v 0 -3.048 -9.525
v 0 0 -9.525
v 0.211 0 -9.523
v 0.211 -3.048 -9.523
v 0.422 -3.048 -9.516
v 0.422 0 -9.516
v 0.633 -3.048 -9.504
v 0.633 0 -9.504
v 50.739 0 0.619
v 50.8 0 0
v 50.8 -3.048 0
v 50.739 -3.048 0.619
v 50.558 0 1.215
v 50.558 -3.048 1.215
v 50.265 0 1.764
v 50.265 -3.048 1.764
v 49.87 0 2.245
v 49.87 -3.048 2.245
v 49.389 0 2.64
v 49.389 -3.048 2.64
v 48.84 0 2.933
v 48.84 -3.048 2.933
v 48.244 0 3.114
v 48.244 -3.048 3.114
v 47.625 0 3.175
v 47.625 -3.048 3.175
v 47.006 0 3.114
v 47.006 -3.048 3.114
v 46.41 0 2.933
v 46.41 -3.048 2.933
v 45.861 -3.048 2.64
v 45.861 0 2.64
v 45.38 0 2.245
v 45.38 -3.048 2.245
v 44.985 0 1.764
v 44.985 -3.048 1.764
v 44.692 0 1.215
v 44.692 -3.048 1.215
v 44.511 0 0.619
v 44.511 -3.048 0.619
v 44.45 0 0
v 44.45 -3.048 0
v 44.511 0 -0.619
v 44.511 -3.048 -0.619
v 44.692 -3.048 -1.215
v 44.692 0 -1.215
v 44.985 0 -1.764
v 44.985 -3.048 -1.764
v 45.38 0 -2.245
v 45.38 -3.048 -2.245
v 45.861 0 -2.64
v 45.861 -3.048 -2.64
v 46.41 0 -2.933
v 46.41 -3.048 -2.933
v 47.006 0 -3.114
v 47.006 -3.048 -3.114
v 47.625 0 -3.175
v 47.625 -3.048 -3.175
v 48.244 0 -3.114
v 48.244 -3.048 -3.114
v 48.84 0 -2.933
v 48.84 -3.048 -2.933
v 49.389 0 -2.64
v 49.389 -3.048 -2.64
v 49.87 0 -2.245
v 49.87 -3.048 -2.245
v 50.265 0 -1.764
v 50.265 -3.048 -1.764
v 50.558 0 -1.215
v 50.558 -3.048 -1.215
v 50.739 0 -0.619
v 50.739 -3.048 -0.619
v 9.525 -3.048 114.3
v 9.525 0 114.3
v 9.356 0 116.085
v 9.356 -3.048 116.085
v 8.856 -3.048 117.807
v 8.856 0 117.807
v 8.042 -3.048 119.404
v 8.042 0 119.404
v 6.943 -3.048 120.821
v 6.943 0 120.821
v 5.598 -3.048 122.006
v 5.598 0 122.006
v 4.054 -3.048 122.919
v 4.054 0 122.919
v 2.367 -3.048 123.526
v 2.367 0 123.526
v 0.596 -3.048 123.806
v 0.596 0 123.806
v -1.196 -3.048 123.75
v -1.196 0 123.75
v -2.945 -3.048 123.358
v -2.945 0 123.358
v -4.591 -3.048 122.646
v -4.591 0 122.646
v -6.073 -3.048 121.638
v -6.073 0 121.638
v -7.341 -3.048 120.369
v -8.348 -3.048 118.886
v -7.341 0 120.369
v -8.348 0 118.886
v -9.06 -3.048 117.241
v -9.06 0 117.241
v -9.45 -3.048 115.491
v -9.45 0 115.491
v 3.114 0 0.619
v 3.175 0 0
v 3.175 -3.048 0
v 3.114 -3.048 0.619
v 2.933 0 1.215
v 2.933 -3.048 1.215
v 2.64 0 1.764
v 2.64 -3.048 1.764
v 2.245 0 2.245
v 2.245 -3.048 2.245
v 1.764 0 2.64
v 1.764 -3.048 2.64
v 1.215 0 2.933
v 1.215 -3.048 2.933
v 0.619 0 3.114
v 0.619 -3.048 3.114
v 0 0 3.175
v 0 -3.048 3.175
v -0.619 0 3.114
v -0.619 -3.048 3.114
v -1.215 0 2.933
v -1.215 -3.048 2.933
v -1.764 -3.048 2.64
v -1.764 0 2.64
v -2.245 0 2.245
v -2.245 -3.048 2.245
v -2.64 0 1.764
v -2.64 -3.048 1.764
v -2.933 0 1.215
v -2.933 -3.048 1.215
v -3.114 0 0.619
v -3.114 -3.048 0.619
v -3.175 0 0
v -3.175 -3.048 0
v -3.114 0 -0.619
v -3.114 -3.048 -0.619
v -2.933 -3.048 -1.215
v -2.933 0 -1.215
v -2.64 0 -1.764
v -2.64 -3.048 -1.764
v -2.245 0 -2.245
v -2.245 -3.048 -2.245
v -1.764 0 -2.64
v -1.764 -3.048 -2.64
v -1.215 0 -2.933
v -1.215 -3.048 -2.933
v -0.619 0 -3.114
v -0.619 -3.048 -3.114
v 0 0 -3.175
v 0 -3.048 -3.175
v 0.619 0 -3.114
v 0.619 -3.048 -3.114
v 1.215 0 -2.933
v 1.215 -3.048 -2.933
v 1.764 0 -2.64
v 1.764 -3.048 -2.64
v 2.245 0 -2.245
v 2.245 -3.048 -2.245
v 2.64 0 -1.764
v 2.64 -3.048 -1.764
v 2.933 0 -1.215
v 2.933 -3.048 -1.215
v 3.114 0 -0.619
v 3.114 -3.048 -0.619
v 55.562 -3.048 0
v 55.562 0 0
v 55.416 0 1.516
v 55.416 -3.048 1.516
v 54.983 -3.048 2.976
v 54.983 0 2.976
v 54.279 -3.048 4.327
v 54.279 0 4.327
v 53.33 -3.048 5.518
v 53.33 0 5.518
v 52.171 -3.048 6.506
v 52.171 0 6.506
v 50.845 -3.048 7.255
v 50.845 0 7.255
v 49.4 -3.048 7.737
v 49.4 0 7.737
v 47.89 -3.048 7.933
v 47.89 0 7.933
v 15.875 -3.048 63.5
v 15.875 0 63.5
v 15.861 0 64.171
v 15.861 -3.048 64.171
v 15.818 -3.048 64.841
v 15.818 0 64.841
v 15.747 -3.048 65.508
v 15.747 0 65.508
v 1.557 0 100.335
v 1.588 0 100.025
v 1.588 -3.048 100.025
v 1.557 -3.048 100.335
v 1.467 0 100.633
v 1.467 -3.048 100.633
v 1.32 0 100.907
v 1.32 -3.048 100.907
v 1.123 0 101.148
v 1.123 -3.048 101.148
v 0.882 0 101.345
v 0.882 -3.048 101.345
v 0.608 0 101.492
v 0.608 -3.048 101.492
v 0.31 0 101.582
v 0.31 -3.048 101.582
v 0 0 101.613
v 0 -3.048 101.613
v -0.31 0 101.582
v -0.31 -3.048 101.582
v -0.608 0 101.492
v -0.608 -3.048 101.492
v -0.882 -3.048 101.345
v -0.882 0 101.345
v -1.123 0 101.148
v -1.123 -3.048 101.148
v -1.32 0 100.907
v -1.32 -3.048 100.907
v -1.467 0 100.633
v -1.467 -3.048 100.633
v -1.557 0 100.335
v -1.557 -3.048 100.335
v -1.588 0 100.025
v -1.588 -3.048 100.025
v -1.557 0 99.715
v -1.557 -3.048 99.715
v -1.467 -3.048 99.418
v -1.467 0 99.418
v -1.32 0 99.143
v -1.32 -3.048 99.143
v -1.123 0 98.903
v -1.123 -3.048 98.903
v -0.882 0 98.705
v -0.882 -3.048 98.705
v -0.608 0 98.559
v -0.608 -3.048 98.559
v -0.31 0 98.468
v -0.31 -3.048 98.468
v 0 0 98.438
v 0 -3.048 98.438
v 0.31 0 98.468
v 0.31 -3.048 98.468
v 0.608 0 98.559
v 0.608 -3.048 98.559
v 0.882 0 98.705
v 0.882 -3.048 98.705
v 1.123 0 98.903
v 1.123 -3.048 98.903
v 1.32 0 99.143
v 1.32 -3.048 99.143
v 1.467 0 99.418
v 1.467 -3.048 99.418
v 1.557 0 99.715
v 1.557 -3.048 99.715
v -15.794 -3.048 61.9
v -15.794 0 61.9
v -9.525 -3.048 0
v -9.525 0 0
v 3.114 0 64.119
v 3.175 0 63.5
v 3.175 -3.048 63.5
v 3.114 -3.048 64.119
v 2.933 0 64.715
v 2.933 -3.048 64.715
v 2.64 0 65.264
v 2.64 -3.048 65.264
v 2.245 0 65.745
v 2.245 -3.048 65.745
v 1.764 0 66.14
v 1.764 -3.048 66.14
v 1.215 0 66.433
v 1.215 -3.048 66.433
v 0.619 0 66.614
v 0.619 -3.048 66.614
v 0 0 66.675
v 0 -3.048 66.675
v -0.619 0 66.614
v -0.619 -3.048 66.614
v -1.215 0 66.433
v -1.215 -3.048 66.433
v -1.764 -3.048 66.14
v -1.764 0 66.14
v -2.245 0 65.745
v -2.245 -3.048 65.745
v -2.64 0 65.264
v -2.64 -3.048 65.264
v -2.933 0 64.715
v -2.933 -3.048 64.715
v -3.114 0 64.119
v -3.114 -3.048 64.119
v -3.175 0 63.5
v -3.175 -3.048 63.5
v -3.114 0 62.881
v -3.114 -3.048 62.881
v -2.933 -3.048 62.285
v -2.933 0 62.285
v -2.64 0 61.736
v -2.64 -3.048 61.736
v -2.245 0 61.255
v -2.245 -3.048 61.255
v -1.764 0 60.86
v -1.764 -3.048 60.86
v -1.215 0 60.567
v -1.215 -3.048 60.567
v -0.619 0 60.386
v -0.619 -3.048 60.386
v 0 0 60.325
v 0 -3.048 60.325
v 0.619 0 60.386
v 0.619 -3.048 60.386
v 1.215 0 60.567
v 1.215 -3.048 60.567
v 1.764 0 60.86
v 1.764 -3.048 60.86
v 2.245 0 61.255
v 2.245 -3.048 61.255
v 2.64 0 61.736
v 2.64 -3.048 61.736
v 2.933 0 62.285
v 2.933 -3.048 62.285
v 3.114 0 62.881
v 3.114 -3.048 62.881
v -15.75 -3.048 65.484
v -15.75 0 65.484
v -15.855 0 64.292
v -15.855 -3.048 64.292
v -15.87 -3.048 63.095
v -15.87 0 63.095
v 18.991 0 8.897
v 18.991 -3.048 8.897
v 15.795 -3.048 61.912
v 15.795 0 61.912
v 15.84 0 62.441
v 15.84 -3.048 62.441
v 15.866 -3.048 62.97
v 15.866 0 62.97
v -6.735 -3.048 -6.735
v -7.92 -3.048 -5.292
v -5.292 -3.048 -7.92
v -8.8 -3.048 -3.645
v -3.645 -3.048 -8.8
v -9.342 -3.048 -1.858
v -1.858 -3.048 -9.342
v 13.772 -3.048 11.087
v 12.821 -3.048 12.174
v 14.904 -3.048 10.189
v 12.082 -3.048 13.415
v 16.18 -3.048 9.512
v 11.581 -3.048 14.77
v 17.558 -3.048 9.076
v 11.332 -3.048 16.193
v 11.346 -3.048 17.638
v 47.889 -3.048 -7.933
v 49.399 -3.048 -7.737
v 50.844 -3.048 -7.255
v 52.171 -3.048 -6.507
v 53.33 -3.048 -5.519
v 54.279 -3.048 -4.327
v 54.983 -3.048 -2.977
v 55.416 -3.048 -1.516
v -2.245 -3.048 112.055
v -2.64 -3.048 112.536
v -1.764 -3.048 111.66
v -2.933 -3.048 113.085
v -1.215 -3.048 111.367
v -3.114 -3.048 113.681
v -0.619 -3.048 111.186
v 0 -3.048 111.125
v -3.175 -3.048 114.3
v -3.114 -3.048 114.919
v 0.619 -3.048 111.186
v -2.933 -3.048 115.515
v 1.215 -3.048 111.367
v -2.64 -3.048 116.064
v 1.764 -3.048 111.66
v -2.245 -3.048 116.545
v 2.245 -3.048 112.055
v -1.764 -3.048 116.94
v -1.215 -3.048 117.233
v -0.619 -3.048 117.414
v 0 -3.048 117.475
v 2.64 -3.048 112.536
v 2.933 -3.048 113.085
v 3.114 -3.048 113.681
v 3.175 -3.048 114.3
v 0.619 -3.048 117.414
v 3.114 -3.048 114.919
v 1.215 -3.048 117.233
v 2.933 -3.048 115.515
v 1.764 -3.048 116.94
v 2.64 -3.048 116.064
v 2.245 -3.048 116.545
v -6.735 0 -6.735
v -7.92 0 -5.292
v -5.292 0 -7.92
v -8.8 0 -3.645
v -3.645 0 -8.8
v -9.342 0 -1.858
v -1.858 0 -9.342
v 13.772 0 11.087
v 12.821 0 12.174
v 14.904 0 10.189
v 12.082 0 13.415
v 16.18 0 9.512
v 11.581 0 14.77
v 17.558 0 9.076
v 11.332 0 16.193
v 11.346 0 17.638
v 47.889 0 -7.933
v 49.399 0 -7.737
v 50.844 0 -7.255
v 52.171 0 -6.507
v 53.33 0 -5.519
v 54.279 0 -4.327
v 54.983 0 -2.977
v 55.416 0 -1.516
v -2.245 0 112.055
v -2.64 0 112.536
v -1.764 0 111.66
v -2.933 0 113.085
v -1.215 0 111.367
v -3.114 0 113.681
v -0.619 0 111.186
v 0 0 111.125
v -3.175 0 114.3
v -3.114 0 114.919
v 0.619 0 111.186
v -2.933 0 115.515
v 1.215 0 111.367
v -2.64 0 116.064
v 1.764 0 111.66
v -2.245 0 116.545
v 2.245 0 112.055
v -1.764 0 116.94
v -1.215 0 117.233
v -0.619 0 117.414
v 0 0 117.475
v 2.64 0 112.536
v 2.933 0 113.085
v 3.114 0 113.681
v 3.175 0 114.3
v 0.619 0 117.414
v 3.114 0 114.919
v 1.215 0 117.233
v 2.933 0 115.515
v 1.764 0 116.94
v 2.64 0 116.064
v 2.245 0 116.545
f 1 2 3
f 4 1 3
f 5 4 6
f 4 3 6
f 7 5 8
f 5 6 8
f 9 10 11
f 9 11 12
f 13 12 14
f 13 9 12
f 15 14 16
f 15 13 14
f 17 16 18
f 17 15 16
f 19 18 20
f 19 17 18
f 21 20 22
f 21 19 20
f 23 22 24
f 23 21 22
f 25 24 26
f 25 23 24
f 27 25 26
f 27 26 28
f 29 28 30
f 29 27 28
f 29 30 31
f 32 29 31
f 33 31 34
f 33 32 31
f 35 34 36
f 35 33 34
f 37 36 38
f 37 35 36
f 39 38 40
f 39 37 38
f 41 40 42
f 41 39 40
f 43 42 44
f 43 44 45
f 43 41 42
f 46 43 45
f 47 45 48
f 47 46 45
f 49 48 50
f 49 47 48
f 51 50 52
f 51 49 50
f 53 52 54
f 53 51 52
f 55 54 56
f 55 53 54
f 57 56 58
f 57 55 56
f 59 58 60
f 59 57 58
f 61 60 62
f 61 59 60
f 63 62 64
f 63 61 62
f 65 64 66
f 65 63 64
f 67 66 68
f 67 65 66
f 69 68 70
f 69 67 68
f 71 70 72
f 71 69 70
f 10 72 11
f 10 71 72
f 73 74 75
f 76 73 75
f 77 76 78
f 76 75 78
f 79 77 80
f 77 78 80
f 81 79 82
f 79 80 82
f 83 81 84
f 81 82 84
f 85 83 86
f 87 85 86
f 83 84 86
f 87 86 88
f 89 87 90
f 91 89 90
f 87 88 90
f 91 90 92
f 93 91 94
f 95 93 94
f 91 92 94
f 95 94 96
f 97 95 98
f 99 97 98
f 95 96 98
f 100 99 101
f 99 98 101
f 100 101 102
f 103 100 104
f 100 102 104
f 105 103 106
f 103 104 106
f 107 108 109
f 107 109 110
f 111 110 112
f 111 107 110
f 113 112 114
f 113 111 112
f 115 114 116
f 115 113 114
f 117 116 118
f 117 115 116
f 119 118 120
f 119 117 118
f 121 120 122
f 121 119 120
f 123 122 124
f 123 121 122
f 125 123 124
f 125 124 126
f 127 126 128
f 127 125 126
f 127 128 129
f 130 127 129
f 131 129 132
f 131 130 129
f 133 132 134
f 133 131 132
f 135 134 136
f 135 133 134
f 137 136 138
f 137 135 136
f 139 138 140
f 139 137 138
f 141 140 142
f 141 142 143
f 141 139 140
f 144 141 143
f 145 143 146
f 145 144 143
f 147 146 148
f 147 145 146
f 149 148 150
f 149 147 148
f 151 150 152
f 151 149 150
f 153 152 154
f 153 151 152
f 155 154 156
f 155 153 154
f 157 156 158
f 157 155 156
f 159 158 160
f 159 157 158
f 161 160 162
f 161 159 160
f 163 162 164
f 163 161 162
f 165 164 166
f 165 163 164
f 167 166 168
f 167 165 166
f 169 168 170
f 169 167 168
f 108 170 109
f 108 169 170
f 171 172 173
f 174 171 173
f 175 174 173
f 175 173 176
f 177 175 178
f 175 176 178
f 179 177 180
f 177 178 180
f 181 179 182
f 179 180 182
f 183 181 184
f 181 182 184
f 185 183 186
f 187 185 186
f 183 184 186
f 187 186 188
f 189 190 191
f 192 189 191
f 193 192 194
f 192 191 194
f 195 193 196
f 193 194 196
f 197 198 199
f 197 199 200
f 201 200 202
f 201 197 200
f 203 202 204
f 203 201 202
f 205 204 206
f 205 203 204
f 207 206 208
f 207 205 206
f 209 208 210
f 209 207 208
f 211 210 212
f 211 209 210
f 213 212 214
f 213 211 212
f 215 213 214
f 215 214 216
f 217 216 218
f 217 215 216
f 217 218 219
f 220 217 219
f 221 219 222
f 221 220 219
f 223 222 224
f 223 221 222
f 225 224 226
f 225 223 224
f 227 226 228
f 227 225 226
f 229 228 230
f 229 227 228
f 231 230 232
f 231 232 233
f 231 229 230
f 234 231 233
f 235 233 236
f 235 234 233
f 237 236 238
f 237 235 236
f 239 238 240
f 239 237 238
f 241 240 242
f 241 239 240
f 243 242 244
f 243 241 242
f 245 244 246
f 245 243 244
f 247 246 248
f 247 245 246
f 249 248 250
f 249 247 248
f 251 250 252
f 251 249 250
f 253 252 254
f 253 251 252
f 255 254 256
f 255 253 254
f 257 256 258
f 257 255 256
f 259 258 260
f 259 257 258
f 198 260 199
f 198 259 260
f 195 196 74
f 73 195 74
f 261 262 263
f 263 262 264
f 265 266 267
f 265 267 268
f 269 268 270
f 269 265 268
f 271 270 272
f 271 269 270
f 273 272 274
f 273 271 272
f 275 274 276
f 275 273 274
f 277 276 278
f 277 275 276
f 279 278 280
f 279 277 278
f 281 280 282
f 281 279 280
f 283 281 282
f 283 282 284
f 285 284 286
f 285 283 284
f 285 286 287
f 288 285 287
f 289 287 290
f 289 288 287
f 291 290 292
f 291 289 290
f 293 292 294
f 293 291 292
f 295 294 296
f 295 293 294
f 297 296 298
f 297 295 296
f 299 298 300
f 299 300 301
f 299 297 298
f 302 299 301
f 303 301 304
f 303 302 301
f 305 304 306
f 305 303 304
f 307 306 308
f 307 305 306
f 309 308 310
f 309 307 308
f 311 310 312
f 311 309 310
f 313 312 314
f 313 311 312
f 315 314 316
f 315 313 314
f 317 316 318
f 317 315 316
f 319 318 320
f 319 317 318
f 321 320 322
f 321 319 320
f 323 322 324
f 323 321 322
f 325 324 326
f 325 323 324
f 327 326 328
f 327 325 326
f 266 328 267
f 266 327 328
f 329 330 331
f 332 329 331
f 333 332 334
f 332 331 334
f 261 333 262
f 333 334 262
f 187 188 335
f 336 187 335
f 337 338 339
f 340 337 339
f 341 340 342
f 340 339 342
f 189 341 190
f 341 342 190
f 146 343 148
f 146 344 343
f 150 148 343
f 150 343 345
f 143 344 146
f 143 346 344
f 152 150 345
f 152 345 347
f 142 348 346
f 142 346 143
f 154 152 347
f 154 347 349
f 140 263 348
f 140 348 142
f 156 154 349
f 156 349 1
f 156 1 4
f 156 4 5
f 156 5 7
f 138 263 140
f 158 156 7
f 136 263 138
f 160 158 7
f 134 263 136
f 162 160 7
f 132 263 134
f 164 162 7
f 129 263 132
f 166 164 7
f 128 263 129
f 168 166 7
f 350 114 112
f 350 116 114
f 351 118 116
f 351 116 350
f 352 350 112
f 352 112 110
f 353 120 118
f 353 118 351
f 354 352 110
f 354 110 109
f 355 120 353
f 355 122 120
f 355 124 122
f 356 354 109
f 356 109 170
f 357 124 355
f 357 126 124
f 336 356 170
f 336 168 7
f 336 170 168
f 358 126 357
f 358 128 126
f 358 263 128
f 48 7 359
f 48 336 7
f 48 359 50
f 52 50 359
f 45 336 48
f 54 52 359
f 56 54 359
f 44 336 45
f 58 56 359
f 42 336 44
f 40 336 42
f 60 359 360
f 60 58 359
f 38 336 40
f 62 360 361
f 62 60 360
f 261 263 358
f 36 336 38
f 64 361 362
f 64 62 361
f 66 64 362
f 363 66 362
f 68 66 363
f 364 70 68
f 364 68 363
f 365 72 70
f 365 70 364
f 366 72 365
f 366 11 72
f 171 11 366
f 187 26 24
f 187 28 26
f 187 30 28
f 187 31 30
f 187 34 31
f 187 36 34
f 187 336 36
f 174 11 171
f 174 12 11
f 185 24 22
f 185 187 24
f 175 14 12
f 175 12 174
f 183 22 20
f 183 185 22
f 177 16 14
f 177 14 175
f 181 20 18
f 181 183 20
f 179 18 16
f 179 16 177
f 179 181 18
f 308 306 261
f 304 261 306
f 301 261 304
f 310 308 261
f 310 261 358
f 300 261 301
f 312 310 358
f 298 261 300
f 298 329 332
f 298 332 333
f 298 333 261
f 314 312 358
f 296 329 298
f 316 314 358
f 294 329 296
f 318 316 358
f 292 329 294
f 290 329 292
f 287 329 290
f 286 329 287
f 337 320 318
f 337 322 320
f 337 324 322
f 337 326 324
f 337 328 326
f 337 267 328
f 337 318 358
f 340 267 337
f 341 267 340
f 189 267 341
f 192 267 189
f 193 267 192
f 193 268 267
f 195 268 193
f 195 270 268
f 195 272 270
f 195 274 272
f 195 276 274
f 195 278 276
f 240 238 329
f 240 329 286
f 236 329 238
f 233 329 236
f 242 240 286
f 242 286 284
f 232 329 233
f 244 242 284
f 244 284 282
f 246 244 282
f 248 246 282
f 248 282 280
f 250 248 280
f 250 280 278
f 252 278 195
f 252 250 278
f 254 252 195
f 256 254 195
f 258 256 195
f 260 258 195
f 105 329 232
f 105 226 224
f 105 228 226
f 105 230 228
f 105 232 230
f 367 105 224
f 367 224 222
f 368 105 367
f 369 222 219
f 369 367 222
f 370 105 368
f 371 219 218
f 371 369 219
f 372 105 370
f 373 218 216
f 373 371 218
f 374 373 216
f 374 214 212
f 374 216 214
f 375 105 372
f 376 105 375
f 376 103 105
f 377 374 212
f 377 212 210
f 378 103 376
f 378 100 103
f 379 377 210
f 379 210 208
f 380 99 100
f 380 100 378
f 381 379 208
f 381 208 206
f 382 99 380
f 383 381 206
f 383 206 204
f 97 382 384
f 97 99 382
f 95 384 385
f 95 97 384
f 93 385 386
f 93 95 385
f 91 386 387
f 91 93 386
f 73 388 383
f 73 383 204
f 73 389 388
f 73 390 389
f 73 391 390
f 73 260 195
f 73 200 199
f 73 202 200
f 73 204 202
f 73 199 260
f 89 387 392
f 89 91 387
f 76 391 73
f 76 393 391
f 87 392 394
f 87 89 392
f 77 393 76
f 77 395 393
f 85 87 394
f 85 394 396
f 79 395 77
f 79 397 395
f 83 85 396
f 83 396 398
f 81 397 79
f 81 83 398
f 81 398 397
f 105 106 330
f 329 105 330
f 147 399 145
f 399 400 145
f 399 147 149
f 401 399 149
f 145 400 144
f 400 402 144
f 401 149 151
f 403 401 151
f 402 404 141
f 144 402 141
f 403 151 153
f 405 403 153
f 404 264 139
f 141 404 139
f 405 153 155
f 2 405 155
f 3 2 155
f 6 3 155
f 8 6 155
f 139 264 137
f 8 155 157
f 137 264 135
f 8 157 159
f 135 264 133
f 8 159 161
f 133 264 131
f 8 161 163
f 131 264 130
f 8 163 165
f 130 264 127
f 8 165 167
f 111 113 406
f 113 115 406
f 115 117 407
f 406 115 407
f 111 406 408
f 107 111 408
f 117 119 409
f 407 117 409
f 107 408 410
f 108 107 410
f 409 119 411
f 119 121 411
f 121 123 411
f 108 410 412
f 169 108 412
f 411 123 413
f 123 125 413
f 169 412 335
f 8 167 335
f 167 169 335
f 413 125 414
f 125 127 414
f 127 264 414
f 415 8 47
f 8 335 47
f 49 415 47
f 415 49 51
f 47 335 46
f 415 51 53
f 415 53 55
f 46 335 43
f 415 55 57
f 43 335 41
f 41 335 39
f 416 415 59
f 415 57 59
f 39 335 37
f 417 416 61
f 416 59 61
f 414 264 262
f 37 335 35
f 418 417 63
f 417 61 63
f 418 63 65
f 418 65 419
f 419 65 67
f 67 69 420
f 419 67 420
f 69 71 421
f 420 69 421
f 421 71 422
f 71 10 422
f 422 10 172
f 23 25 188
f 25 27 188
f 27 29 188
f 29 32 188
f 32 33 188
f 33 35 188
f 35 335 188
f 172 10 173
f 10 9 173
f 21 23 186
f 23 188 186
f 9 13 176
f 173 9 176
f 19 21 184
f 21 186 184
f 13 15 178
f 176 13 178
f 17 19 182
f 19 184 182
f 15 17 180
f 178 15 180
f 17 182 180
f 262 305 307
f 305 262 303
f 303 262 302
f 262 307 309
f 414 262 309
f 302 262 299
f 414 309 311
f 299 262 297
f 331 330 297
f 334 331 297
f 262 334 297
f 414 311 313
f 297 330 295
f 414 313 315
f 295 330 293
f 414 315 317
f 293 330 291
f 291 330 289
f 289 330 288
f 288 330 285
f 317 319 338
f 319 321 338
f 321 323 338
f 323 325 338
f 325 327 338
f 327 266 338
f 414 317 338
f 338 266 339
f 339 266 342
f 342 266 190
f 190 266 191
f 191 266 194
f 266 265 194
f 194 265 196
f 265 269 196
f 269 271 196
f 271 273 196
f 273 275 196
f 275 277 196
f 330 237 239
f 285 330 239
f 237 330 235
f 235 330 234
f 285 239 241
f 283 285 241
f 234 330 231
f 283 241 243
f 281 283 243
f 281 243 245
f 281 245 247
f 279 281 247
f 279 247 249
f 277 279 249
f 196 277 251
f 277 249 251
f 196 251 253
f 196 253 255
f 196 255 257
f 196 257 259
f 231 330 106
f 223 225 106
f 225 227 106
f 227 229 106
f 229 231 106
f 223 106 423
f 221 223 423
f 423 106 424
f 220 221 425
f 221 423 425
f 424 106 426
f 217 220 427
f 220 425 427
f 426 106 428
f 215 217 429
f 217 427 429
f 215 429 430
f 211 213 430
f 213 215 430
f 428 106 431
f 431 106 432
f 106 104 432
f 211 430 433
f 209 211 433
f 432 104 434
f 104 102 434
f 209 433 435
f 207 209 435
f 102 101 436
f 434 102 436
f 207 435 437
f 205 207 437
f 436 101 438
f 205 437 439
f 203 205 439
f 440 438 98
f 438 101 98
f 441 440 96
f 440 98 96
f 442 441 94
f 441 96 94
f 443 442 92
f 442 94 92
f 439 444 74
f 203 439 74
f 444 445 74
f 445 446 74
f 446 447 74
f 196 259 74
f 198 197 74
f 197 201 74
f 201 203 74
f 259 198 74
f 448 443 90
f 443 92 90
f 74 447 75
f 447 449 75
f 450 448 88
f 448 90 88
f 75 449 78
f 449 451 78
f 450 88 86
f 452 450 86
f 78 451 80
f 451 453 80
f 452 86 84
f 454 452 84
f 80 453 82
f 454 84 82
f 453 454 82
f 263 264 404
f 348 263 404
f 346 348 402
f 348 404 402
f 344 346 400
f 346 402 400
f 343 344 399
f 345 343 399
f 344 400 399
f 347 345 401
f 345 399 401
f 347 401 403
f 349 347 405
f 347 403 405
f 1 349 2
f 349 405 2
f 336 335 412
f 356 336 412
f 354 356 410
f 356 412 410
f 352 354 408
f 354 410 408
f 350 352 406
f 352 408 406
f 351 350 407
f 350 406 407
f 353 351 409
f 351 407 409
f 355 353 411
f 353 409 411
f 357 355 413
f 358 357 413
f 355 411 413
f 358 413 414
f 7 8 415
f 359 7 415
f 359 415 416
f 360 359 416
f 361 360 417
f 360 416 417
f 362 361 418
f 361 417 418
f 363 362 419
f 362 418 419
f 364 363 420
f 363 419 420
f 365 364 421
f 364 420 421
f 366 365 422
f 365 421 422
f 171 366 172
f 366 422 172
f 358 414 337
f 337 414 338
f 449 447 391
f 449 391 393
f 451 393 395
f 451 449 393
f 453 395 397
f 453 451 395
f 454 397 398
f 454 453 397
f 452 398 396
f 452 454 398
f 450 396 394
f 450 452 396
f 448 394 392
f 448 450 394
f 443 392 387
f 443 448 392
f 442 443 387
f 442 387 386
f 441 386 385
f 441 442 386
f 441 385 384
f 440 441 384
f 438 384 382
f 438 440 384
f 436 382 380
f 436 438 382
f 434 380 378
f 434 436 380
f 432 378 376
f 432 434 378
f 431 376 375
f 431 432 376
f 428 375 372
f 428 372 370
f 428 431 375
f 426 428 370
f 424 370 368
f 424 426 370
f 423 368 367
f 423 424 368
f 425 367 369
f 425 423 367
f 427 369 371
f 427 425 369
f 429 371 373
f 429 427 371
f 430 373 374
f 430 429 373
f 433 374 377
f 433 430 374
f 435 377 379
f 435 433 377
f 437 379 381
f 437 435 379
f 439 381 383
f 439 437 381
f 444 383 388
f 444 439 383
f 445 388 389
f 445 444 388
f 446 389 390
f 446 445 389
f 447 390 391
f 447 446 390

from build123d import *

# Parameters (mm, degrees)
F0_R     = 3.175
F0_R_2   = 1.5875
F1_DEPTH = 3.048


with BuildPart() as f1:
    # F0 (on Front) → F1 (new body)
    with BuildSketch(Plane.XZ):
        with BuildLine():
            ThreePointArc((0.632547, -9.503973), (6.955237, -6.507711), (9.525, 0))
            ThreePointArc((9.525, 0), (0, 9.525), (-9.525, 0))
            ThreePointArc((-9.525, 0), (-6.735192, -6.735192), (0, -9.525))
            Line((0, -9.525), (0.632547, -9.503973))
        make_face()
        Circle(F0_R, mode=Mode.SUBTRACT)
        with BuildLine():
            ThreePointArc((-9.525, 0), (0, 9.525), (9.525, 0))
            ThreePointArc((9.525, 0), (6.955237, -6.507711), (0.632547, -9.503973))
            Line((0.632547, -9.503973), (47.888707, -7.933118))
            ThreePointArc((47.888707, -7.933118), (39.6875, 0.000438), (47.889583, 7.933089))
            Line((47.889583, 7.933089), (18.990985, 8.896911))
            ThreePointArc((18.990985, 8.896911), (13.271886, 11.608559), (11.345642, 17.637713))
            Line((11.345642, 17.637713), (15.795426, 61.9125))
            ThreePointArc((15.795426, 61.9125), (0.006091, 47.625001), (-15.794203, 61.90038))
            Line((-15.794203, 61.90038), (-9.525, 0))
        make_face()
        with BuildLine():
            ThreePointArc((0, -9.525), (0.316448, -9.519742), (0.632547, -9.503973))
            Line((0.632547, -9.503973), (0, -9.525))
        make_face()
        with BuildLine():
            ThreePointArc((-15.750488, 65.484375), (-15.873819, 63.693615), (-15.794203, 61.90038))
            ThreePointArc((-15.794203, 61.90038), (0.006091, 47.625001), (15.795426, 61.9125))
            ThreePointArc((15.795426, 61.9125), (15.855094, 62.705253), (15.875, 63.5))
            ThreePointArc((15.875, 63.5), (15.843082, 64.506168), (15.747457, 65.508289))
            ThreePointArc((15.747457, 65.508289), (-0.012053, 79.374995), (-15.750488, 65.484375))
        make_face()
        with Locations((0, 63.5)):
            Circle(F0_R, mode=Mode.SUBTRACT)
        with BuildLine():
            ThreePointArc((47.889583, 7.933089), (39.6875, 0.000438), (47.888707, -7.933118))
            ThreePointArc((47.888707, -7.933118), (53.330133, -5.518638), (55.5625, 0))
            ThreePointArc((55.5625, 0), (53.330438, 5.518323), (47.889583, 7.933089))
        make_face()
        with Locations((47.625, 0)):
            Circle(F0_R, mode=Mode.SUBTRACT)
        with BuildLine():
            Line((-9.450293, 115.490625), (-15.750488, 65.484375))
            ThreePointArc((-15.750488, 65.484375), (-0.012053, 79.374995), (15.747457, 65.508289))
            Line((15.747457, 65.508289), (9.525, 114.3))
            ThreePointArc((9.525, 114.3), (-0.596483, 104.793695), (-9.450293, 115.490625))
        make_face()
        with Locations((0, 100.0252)):
            Circle(F0_R_2, mode=Mode.SUBTRACT)
        with BuildLine():
            ThreePointArc((9.525, 114.3), (0.596483, 123.806305), (-9.450293, 115.490625))
            ThreePointArc((-9.450293, 115.490625), (-0.596483, 104.793695), (9.525, 114.3))
        make_face()
        with Locations((0, 114.3)):
            Circle(F0_R, mode=Mode.SUBTRACT)
    extrude(amount=F1_DEPTH)


solid = f1.part
